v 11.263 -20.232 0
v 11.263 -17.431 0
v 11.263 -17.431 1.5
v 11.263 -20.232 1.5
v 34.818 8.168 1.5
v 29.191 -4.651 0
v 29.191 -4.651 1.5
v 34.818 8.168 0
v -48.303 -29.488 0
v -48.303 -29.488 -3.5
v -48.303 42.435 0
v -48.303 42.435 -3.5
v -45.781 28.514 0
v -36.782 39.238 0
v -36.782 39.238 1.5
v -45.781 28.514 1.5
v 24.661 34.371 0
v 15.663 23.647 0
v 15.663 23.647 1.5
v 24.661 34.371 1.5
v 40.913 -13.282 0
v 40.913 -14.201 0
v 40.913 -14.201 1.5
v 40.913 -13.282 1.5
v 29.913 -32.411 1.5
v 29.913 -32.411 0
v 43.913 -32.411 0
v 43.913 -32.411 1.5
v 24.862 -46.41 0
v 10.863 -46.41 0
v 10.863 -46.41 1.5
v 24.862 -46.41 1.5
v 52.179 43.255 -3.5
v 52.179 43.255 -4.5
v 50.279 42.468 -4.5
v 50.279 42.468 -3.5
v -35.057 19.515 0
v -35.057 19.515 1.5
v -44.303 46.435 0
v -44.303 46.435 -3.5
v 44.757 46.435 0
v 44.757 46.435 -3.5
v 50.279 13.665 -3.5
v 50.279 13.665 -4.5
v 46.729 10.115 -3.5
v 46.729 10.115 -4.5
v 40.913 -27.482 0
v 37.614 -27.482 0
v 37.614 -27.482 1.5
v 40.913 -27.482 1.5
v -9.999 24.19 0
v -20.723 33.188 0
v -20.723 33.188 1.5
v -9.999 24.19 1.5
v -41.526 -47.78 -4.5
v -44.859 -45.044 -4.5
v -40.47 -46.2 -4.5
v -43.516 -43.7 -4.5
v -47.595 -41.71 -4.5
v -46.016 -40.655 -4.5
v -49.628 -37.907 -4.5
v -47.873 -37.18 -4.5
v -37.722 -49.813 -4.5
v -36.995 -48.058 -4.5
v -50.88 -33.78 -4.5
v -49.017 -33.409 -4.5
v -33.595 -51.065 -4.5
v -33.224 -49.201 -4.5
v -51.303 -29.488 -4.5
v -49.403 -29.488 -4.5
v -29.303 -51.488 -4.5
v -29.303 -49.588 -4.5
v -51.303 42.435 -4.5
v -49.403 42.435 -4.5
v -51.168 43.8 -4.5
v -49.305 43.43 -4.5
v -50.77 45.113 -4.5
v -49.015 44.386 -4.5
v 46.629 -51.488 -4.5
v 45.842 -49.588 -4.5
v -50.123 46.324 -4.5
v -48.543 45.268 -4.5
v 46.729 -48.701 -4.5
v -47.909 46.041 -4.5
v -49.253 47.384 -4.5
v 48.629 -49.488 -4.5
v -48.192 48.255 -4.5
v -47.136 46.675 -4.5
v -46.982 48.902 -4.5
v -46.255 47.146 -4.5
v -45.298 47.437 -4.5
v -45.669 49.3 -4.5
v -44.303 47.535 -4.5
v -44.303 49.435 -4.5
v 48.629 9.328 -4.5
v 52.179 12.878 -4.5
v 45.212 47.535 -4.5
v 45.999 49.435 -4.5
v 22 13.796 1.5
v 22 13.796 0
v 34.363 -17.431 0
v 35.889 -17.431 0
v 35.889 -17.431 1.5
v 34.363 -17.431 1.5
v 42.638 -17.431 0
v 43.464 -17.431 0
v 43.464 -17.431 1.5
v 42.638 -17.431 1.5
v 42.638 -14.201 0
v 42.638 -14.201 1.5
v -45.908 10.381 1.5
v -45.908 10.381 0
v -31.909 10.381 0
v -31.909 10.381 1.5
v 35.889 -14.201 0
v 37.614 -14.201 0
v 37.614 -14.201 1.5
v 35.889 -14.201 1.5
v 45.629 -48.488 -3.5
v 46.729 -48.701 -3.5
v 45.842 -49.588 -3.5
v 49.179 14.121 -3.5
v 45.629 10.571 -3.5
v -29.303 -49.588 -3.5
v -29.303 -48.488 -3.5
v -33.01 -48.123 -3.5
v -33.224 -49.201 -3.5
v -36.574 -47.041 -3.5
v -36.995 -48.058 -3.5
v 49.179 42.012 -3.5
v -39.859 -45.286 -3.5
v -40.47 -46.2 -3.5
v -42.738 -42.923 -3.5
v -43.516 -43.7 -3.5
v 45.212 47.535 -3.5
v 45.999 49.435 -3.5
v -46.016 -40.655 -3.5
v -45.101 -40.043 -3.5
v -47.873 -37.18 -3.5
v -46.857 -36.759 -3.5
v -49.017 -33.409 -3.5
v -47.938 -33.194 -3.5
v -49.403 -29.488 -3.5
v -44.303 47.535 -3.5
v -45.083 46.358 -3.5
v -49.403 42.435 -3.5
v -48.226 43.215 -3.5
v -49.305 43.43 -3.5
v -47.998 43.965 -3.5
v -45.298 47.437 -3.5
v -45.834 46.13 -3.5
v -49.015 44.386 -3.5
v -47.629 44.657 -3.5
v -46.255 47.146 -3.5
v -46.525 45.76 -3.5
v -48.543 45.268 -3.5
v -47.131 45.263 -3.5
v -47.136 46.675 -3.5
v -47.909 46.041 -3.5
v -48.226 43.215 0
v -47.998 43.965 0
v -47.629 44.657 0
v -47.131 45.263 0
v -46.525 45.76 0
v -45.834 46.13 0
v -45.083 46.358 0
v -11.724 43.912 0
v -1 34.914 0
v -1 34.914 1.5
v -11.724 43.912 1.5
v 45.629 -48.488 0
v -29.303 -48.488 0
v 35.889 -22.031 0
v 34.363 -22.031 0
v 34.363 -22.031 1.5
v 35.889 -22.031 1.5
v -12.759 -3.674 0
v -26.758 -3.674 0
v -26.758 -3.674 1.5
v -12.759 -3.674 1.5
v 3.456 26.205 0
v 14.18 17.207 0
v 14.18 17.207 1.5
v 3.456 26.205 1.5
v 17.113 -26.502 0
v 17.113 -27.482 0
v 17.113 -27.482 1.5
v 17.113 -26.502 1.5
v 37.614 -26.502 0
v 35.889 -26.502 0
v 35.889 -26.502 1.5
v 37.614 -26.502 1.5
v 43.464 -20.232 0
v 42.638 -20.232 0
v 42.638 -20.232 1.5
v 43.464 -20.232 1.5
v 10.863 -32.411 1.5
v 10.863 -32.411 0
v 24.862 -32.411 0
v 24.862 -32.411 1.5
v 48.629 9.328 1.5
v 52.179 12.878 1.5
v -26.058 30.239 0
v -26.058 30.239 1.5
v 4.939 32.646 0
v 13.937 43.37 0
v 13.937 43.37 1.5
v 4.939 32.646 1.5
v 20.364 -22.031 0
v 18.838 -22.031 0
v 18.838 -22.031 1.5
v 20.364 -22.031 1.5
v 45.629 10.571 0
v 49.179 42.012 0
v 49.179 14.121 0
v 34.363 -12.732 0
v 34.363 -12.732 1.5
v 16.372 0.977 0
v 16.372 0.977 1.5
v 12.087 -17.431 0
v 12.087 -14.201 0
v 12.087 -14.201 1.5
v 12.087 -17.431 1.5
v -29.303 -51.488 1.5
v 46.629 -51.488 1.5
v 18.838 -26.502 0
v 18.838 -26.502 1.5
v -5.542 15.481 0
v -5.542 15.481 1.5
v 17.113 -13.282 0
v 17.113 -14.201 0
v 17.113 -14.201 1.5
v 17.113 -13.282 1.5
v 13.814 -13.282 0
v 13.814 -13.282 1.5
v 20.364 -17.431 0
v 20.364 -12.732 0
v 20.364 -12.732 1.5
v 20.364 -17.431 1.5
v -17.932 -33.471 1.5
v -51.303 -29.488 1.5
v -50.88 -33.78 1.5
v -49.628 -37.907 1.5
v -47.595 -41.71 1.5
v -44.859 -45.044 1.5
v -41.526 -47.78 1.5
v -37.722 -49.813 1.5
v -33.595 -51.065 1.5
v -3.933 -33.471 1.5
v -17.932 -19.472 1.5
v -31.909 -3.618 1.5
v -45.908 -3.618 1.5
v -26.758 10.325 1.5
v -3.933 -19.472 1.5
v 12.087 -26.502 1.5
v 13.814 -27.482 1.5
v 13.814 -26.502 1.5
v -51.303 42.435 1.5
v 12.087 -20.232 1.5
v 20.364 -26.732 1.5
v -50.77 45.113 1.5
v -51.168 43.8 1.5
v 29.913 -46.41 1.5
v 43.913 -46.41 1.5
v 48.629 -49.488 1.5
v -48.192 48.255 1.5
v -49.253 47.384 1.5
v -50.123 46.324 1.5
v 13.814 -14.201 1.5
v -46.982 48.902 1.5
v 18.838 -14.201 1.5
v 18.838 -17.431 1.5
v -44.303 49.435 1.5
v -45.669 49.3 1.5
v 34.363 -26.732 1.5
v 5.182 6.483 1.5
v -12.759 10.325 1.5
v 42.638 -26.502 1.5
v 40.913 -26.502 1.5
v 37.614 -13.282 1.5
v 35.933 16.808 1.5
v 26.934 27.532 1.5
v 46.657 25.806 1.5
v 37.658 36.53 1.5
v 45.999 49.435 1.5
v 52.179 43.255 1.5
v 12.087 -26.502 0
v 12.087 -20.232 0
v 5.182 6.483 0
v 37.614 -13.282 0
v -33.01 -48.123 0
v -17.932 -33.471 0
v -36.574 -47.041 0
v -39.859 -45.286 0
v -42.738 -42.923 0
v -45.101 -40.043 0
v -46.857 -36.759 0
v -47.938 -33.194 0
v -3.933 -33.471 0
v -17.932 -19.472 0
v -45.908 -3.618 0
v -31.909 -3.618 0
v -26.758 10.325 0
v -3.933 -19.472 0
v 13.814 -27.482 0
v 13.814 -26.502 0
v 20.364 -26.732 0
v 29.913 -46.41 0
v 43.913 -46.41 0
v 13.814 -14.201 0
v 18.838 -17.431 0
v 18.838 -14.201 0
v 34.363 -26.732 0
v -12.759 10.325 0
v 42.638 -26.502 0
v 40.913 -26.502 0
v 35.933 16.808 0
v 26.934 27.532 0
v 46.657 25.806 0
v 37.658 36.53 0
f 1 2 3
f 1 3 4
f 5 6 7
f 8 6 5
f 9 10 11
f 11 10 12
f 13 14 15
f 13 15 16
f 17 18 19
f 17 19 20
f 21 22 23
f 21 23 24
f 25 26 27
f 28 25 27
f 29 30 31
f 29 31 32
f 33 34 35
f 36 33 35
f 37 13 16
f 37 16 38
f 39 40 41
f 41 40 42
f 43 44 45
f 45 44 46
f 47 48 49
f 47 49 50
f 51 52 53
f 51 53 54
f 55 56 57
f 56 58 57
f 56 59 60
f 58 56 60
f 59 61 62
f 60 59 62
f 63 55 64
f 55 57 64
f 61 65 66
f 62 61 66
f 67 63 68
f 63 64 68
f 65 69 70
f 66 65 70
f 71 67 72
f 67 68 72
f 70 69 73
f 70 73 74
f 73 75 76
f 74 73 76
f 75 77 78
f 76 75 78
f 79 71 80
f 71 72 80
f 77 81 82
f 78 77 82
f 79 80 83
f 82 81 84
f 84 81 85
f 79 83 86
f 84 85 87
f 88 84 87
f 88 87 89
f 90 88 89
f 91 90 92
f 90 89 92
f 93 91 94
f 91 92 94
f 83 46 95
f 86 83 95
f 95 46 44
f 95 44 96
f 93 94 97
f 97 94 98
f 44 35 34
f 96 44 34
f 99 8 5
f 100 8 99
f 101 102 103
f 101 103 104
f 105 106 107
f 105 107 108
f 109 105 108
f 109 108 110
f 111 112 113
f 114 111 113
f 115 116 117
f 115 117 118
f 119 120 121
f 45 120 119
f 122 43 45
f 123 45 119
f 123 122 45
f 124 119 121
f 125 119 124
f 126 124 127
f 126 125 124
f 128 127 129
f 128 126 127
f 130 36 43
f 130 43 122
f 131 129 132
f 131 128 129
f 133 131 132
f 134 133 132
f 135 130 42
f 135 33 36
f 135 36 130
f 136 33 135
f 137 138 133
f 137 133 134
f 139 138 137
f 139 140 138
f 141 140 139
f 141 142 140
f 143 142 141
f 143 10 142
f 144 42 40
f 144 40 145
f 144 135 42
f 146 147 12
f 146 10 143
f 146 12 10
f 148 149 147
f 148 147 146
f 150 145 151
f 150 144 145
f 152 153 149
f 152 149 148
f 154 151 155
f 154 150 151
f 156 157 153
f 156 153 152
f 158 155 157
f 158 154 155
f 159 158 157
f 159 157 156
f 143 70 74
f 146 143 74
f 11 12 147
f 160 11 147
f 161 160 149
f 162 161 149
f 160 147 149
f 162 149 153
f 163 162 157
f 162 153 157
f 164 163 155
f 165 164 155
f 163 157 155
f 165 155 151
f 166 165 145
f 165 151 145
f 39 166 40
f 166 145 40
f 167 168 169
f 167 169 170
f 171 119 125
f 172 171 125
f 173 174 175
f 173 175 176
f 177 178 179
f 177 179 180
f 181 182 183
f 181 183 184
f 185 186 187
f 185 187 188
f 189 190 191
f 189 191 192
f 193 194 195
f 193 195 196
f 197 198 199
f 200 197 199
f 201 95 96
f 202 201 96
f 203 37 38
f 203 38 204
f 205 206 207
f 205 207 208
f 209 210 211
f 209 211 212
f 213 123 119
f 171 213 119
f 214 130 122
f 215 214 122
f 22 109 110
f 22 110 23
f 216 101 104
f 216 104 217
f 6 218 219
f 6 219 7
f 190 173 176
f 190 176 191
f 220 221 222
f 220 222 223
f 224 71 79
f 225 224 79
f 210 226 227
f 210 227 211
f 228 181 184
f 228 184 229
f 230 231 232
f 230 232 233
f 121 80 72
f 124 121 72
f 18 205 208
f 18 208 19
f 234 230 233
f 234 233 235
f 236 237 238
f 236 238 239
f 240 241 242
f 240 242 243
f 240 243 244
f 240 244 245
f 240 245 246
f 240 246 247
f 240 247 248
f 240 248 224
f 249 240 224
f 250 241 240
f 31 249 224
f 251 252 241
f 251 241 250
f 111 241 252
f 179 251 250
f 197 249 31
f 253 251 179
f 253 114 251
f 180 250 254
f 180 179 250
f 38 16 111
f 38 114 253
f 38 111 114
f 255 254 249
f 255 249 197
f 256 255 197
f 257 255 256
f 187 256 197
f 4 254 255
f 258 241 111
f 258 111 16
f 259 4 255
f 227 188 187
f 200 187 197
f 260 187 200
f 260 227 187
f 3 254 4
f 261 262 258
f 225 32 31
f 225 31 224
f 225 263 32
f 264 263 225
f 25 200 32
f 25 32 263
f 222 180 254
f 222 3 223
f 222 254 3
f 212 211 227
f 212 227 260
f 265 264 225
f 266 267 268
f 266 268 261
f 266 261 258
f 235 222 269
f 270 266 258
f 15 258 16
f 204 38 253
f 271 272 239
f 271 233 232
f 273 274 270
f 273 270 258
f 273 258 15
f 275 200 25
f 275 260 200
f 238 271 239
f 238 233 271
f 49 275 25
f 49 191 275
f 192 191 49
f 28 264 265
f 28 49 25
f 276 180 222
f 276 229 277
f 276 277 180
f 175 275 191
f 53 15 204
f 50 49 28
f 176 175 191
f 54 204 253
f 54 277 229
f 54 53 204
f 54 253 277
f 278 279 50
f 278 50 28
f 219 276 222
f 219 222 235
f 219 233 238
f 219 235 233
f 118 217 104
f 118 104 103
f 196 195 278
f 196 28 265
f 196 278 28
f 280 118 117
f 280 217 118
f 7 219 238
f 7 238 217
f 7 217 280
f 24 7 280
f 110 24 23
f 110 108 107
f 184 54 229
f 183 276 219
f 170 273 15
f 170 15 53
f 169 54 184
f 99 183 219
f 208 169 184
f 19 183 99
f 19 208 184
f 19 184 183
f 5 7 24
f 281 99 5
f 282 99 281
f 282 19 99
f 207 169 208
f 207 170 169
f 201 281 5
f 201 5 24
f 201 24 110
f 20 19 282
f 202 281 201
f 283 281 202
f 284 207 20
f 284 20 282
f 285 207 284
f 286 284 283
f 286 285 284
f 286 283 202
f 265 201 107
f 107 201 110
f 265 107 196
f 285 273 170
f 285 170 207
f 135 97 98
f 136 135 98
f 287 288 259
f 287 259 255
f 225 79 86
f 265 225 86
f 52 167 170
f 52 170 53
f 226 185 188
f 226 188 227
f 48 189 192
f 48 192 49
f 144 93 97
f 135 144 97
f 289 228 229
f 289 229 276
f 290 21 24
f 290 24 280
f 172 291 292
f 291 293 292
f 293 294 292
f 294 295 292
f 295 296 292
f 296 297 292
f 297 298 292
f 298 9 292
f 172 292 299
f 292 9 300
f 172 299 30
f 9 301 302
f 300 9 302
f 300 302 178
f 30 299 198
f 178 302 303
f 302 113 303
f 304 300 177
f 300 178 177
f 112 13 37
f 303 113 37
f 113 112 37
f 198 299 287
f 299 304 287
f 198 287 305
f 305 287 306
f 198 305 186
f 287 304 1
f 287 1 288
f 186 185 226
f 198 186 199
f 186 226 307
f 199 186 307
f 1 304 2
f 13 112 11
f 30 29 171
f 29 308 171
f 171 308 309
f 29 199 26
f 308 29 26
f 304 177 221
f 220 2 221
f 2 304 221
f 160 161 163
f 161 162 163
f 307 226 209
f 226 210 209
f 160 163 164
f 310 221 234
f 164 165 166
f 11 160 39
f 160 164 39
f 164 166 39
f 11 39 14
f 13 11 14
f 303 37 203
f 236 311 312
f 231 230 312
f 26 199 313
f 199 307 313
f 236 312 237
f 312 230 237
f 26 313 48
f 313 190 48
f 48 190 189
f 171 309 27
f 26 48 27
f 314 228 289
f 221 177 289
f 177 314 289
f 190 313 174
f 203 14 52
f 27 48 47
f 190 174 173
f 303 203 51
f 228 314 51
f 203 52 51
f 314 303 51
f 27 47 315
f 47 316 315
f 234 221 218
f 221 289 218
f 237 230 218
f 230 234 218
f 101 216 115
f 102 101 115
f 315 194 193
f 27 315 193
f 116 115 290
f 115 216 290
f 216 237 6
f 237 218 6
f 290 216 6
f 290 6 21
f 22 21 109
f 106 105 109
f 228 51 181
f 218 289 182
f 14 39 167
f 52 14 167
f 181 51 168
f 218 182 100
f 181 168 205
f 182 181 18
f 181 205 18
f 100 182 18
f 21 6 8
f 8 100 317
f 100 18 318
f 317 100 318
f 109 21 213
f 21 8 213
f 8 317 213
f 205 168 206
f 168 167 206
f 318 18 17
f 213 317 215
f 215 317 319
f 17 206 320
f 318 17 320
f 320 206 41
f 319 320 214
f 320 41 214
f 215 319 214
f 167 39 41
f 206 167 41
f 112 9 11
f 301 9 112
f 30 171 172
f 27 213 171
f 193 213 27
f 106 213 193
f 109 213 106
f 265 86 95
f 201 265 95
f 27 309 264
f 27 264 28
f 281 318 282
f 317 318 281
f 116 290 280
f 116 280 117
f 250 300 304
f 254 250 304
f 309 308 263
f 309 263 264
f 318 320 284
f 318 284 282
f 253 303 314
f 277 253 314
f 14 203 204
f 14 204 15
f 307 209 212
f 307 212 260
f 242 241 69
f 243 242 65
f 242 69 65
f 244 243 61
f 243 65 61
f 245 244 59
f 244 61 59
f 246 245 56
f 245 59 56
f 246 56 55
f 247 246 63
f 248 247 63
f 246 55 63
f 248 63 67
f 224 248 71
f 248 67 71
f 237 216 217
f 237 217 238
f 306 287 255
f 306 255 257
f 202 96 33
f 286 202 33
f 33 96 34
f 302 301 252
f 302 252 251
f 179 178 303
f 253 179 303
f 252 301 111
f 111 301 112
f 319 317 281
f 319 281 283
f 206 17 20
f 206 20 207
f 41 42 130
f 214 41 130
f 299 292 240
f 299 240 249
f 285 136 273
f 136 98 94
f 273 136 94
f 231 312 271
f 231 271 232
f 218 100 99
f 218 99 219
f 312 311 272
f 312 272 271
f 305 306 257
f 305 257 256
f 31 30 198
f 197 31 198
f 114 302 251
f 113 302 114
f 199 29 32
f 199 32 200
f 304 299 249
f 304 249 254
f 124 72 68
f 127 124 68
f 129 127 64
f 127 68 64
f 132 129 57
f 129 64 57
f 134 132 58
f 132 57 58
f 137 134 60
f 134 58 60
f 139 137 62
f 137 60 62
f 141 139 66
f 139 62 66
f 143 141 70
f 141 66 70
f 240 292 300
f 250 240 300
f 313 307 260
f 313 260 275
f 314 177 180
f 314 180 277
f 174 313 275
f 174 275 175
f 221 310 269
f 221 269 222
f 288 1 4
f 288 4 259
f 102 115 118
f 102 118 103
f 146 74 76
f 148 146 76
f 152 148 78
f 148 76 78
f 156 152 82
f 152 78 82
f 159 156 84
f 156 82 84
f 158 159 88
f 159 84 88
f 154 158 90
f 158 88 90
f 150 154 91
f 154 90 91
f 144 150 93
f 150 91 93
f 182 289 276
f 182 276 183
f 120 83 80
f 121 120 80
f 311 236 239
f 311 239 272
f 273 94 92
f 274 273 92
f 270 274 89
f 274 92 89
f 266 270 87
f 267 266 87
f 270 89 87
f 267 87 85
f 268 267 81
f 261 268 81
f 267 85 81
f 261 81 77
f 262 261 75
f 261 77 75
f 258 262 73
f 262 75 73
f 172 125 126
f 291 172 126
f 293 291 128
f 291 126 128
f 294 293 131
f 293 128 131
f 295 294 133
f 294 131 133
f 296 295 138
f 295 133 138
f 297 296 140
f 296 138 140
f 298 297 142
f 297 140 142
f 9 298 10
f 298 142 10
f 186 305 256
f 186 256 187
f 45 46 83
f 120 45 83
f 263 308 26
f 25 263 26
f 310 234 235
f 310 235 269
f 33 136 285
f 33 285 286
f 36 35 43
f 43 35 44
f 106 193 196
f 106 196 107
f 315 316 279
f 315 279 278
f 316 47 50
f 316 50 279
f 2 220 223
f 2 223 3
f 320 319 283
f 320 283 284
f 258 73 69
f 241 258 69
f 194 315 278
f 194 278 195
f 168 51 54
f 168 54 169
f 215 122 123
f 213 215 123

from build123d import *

# Parameters (mm, degrees)
MODEL_W         = 13.9993
MODEL_H         = 13.9993
EXTRUDE_1_DEPTH = 1.5
EXTRUDE_START   = 3.5
EXTRUDE_2_DEPTH = 3.5
CHAMFER_1_SIZE  = 2
EXTRUDE_START_2 = 1
EXTRUDE_3_DEPTH = 1


with BuildPart() as part:
    # Model → 凸台-拉伸1 (new body)
    with BuildSketch(Plane.XY):
        with BuildLine():
            Line((45.999313773, 49.434568323), (-44.302972349, 49.434568323))
            ThreePointArc((-44.302972349, 49.434568323), (-49.252719817, 47.384315792), (-51.302972349, 42.434568323))
            Line((-51.302972349, 42.434568323), (-51.302972349, -29.48760905))
            ThreePointArc((-51.302972349, -29.48760905), (-44.859321535, -45.043958236), (-29.302972349, -51.48760905))
            Line((-29.302972349, -51.48760905), (48.628680412, -51.48760905))
            Line((48.628680412, -51.48760905), (48.628680412, 9.328079248))
            Line((48.628680412, 9.328079248), (52.178865693, 12.878264529))
            Line((52.178865693, 12.878264529), (52.178865693, 43.255016404))
            Line((52.178865693, 43.255016404), (45.999313773, 49.434568323))
        make_face()
        Polygon((37.658208977, 36.530428762), (26.934123004, 27.531852177), (35.932699588, 16.807766205), (46.656785561, 25.806342789), align=None, mode=Mode.SUBTRACT)
        Polygon((13.937335593, 43.369798663), (4.938759009, 32.64571269), (15.662844981, 23.647136106), (24.661421566, 34.371222079), align=None, mode=Mode.SUBTRACT)
        Polygon((-11.724299854, 43.912488191), (-20.722876438, 33.188402219), (-9.998790465, 24.189825635), (-1.000213881, 34.913911607), align=None, mode=Mode.SUBTRACT)
        Polygon((-36.782315633, 39.237800689), (-45.780892217, 28.513714717), (-35.056806244, 19.515138133), (-26.05822966, 30.239224105), align=None, mode=Mode.SUBTRACT)
        Polygon((34.81841009, 8.16776686), (22.000122493, 13.79554649), (16.372342863, 0.977258893), (29.19063046, -4.650520737), align=None, mode=Mode.SUBTRACT)
        Polygon((3.45628169, 26.205455431), (-5.542294894, 15.481369459), (5.181791078, 6.482792875), (14.180367663, 17.206878847), align=None, mode=Mode.SUBTRACT)
        with Locations((17.862828836, -39.410351083)):
            Rectangle(MODEL_W, MODEL_H, mode=Mode.SUBTRACT)
        with Locations((36.913128836, -39.410351083)):
            Rectangle(MODEL_W, MODEL_H, mode=Mode.SUBTRACT)
        Polygon((20.363631661, -17.43145013), (18.837631661, -17.43145013), (18.837631661, -14.20145013), (17.112631661, -14.20145013), (17.112631661, -13.28205013), (13.813631661, -13.28205013), (13.813631661, -14.20145013), (12.086831661, -14.20145013), (12.086831661, -17.43145013), (11.262731661, -17.43145013), (11.262731661, -20.23165013), (12.086831661, -20.23165013), (12.086831661, -26.50175013), (13.813631661, -26.50175013), (13.813631661, -27.48155013), (17.112631661, -27.48155013), (17.112631661, -26.50175013), (18.837631661, -26.50175013), (18.837631661, -22.03145013), (20.363631661, -22.03145013), (20.363631661, -26.73185013), (34.362631661, -26.73185013), (34.362631661, -22.03145013), (35.888631661, -22.03145013), (35.888631661, -26.50175013), (37.613631661, -26.50175013), (37.613631661, -27.48155013), (40.912631661, -27.48155013), (40.912631661, -26.50175013), (42.637631661, -26.50175013), (42.637631661, -20.23165013), (43.463631661, -20.23165013), (43.463631661, -17.43145013), (42.637631661, -17.43145013), (42.637631661, -14.20145013), (40.912631661, -14.20145013), (40.912631661, -13.28205013), (37.613631661, -13.28205013), (37.613631661, -14.20145013), (35.888631661, -14.20145013), (35.888631661, -17.43145013), (34.362631661, -17.43145013), (34.362631661, -12.73245013), (20.363631661, -12.73245013), align=None, mode=Mode.SUBTRACT)
        with Locations((-38.908302282, 3.381462696)):
            Rectangle(MODEL_W, MODEL_H, mode=Mode.SUBTRACT)
        with Locations((-19.758451091, 3.325597175)):
            Rectangle(MODEL_W, MODEL_H, mode=Mode.SUBTRACT)
        with Locations((-10.932627063, -26.471328106)):
            Rectangle(MODEL_W, MODEL_H, mode=Mode.SUBTRACT)
    extrude(amount=EXTRUDE_1_DEPTH)

    # 草图1 → 凸台-拉伸2 (add)
    with BuildSketch(Plane(origin=(0, 0, 0), x_dir=(-1, 0, 0), z_dir=(0, 0, -1)).offset(EXTRUDE_START)):
        with BuildLine():
            Line((51.302972349, -29.48760905), (51.302972349, 42.434568323))
            ThreePointArc((51.302972349, 42.434568323), (49.252719817, 47.384315792), (44.302972349, 49.434568323))
            Line((44.302972349, 49.434568323), (-45.999313773, 49.434568323))
            Line((-45.999313773, 49.434568323), (-52.178865693, 43.255016404))
            Line((-52.178865693, 43.255016404), (-52.178865693, 12.878264529))
            Line((-52.178865693, 12.878264529), (-48.628680412, 9.328079248))
            Line((-48.628680412, 9.328079248), (-48.628680412, -51.48760905))
            Line((-48.628680412, -51.48760905), (29.302972349, -51.48760905))
            ThreePointArc((29.302972349, -51.48760905), (44.859321535, -45.043958236), (51.302972349, -29.48760905))
        make_face()
        with BuildLine():
            Line((44.302972349, 46.434568323), (-44.756673086, 46.434568323))
            Line((-44.756673086, 46.434568323), (-49.178865693, 42.012375717))
            Line((-49.178865693, 42.012375717), (-49.178865693, 14.120905216))
            Line((-49.178865693, 14.120905216), (-45.628680412, 10.570719935))
            Line((-45.628680412, 10.570719935), (-45.628680412, -48.48760905))
            Line((-45.628680412, -48.48760905), (29.302972349, -48.48760905))
            ThreePointArc((29.302972349, -48.48760905), (42.738001191, -42.922637892), (48.302972349, -29.48760905))
            Line((48.302972349, -29.48760905), (48.302972349, 42.434568323))
            ThreePointArc((48.302972349, 42.434568323), (47.131399474, 45.262995448), (44.302972349, 46.434568323))
        make_face(mode=Mode.SUBTRACT)
    extrude(amount=-EXTRUDE_2_DEPTH)

    # 倒角1
    chamfer_1_edges = [part.edges().sort_by_distance(p)[0] for p in [
        (48.628680412, -51.48760905, -1),
    ]]
    chamfer(chamfer_1_edges, length=CHAMFER_1_SIZE)

    # 草图2 → 凸台-拉伸3 (add)
    with BuildSketch(Plane(origin=(0, 0, -3.5), x_dir=(-1, 0, 0), z_dir=(0, 0, -1)).offset(EXTRUDE_START_2)):
        with BuildLine():
            Line((-52.178865693, 43.255016404), (-50.278865693, 42.468010635))
            Line((-50.278865693, 42.468010635), (-50.278865693, 13.665270298))
            Line((-50.278865693, 13.665270298), (-46.728680412, 10.115085017))
            Line((-46.728680412, 10.115085017), (-46.728680412, -48.700603281))
            Line((-46.728680412, -48.700603281), (-45.841674643, -49.58760905))
            Line((-45.841674643, -49.58760905), (29.302972349, -49.58760905))
            ThreePointArc((29.302972349, -49.58760905), (43.515818651, -43.700455352), (49.402972349, -29.48760905))
            Line((49.402972349, -29.48760905), (49.402972349, 42.434568323))
            ThreePointArc((49.402972349, 42.434568323), (47.909216933, 46.040812908), (44.302972349, 47.534568323))
            Line((44.302972349, 47.534568323), (-45.212308005, 47.534568323))
            Line((-45.212308005, 47.534568323), (-45.999313773, 49.434568323))
            Line((-45.999313773, 49.434568323), (44.302972349, 49.434568323))
            ThreePointArc((44.302972349, 49.434568323), (49.252719817, 47.384315792), (51.302972349, 42.434568323))
            Line((51.302972349, 42.434568323), (51.302972349, -29.48760905))
            ThreePointArc((51.302972349, -29.48760905), (44.859321535, -45.043958236), (29.302972349, -51.48760905))
            Line((29.302972349, -51.48760905), (-46.628680412, -51.48760905))
            Line((-46.628680412, -51.48760905), (-48.628680412, -49.48760905))
            Line((-48.628680412, -49.48760905), (-48.628680412, 9.328079248))
            Line((-48.628680412, 9.328079248), (-52.178865693, 12.878264529))
            Line((-52.178865693, 12.878264529), (-52.178865693, 43.255016404))
        make_face()
    extrude(amount=-EXTRUDE_3_DEPTH)


solid = part.part
